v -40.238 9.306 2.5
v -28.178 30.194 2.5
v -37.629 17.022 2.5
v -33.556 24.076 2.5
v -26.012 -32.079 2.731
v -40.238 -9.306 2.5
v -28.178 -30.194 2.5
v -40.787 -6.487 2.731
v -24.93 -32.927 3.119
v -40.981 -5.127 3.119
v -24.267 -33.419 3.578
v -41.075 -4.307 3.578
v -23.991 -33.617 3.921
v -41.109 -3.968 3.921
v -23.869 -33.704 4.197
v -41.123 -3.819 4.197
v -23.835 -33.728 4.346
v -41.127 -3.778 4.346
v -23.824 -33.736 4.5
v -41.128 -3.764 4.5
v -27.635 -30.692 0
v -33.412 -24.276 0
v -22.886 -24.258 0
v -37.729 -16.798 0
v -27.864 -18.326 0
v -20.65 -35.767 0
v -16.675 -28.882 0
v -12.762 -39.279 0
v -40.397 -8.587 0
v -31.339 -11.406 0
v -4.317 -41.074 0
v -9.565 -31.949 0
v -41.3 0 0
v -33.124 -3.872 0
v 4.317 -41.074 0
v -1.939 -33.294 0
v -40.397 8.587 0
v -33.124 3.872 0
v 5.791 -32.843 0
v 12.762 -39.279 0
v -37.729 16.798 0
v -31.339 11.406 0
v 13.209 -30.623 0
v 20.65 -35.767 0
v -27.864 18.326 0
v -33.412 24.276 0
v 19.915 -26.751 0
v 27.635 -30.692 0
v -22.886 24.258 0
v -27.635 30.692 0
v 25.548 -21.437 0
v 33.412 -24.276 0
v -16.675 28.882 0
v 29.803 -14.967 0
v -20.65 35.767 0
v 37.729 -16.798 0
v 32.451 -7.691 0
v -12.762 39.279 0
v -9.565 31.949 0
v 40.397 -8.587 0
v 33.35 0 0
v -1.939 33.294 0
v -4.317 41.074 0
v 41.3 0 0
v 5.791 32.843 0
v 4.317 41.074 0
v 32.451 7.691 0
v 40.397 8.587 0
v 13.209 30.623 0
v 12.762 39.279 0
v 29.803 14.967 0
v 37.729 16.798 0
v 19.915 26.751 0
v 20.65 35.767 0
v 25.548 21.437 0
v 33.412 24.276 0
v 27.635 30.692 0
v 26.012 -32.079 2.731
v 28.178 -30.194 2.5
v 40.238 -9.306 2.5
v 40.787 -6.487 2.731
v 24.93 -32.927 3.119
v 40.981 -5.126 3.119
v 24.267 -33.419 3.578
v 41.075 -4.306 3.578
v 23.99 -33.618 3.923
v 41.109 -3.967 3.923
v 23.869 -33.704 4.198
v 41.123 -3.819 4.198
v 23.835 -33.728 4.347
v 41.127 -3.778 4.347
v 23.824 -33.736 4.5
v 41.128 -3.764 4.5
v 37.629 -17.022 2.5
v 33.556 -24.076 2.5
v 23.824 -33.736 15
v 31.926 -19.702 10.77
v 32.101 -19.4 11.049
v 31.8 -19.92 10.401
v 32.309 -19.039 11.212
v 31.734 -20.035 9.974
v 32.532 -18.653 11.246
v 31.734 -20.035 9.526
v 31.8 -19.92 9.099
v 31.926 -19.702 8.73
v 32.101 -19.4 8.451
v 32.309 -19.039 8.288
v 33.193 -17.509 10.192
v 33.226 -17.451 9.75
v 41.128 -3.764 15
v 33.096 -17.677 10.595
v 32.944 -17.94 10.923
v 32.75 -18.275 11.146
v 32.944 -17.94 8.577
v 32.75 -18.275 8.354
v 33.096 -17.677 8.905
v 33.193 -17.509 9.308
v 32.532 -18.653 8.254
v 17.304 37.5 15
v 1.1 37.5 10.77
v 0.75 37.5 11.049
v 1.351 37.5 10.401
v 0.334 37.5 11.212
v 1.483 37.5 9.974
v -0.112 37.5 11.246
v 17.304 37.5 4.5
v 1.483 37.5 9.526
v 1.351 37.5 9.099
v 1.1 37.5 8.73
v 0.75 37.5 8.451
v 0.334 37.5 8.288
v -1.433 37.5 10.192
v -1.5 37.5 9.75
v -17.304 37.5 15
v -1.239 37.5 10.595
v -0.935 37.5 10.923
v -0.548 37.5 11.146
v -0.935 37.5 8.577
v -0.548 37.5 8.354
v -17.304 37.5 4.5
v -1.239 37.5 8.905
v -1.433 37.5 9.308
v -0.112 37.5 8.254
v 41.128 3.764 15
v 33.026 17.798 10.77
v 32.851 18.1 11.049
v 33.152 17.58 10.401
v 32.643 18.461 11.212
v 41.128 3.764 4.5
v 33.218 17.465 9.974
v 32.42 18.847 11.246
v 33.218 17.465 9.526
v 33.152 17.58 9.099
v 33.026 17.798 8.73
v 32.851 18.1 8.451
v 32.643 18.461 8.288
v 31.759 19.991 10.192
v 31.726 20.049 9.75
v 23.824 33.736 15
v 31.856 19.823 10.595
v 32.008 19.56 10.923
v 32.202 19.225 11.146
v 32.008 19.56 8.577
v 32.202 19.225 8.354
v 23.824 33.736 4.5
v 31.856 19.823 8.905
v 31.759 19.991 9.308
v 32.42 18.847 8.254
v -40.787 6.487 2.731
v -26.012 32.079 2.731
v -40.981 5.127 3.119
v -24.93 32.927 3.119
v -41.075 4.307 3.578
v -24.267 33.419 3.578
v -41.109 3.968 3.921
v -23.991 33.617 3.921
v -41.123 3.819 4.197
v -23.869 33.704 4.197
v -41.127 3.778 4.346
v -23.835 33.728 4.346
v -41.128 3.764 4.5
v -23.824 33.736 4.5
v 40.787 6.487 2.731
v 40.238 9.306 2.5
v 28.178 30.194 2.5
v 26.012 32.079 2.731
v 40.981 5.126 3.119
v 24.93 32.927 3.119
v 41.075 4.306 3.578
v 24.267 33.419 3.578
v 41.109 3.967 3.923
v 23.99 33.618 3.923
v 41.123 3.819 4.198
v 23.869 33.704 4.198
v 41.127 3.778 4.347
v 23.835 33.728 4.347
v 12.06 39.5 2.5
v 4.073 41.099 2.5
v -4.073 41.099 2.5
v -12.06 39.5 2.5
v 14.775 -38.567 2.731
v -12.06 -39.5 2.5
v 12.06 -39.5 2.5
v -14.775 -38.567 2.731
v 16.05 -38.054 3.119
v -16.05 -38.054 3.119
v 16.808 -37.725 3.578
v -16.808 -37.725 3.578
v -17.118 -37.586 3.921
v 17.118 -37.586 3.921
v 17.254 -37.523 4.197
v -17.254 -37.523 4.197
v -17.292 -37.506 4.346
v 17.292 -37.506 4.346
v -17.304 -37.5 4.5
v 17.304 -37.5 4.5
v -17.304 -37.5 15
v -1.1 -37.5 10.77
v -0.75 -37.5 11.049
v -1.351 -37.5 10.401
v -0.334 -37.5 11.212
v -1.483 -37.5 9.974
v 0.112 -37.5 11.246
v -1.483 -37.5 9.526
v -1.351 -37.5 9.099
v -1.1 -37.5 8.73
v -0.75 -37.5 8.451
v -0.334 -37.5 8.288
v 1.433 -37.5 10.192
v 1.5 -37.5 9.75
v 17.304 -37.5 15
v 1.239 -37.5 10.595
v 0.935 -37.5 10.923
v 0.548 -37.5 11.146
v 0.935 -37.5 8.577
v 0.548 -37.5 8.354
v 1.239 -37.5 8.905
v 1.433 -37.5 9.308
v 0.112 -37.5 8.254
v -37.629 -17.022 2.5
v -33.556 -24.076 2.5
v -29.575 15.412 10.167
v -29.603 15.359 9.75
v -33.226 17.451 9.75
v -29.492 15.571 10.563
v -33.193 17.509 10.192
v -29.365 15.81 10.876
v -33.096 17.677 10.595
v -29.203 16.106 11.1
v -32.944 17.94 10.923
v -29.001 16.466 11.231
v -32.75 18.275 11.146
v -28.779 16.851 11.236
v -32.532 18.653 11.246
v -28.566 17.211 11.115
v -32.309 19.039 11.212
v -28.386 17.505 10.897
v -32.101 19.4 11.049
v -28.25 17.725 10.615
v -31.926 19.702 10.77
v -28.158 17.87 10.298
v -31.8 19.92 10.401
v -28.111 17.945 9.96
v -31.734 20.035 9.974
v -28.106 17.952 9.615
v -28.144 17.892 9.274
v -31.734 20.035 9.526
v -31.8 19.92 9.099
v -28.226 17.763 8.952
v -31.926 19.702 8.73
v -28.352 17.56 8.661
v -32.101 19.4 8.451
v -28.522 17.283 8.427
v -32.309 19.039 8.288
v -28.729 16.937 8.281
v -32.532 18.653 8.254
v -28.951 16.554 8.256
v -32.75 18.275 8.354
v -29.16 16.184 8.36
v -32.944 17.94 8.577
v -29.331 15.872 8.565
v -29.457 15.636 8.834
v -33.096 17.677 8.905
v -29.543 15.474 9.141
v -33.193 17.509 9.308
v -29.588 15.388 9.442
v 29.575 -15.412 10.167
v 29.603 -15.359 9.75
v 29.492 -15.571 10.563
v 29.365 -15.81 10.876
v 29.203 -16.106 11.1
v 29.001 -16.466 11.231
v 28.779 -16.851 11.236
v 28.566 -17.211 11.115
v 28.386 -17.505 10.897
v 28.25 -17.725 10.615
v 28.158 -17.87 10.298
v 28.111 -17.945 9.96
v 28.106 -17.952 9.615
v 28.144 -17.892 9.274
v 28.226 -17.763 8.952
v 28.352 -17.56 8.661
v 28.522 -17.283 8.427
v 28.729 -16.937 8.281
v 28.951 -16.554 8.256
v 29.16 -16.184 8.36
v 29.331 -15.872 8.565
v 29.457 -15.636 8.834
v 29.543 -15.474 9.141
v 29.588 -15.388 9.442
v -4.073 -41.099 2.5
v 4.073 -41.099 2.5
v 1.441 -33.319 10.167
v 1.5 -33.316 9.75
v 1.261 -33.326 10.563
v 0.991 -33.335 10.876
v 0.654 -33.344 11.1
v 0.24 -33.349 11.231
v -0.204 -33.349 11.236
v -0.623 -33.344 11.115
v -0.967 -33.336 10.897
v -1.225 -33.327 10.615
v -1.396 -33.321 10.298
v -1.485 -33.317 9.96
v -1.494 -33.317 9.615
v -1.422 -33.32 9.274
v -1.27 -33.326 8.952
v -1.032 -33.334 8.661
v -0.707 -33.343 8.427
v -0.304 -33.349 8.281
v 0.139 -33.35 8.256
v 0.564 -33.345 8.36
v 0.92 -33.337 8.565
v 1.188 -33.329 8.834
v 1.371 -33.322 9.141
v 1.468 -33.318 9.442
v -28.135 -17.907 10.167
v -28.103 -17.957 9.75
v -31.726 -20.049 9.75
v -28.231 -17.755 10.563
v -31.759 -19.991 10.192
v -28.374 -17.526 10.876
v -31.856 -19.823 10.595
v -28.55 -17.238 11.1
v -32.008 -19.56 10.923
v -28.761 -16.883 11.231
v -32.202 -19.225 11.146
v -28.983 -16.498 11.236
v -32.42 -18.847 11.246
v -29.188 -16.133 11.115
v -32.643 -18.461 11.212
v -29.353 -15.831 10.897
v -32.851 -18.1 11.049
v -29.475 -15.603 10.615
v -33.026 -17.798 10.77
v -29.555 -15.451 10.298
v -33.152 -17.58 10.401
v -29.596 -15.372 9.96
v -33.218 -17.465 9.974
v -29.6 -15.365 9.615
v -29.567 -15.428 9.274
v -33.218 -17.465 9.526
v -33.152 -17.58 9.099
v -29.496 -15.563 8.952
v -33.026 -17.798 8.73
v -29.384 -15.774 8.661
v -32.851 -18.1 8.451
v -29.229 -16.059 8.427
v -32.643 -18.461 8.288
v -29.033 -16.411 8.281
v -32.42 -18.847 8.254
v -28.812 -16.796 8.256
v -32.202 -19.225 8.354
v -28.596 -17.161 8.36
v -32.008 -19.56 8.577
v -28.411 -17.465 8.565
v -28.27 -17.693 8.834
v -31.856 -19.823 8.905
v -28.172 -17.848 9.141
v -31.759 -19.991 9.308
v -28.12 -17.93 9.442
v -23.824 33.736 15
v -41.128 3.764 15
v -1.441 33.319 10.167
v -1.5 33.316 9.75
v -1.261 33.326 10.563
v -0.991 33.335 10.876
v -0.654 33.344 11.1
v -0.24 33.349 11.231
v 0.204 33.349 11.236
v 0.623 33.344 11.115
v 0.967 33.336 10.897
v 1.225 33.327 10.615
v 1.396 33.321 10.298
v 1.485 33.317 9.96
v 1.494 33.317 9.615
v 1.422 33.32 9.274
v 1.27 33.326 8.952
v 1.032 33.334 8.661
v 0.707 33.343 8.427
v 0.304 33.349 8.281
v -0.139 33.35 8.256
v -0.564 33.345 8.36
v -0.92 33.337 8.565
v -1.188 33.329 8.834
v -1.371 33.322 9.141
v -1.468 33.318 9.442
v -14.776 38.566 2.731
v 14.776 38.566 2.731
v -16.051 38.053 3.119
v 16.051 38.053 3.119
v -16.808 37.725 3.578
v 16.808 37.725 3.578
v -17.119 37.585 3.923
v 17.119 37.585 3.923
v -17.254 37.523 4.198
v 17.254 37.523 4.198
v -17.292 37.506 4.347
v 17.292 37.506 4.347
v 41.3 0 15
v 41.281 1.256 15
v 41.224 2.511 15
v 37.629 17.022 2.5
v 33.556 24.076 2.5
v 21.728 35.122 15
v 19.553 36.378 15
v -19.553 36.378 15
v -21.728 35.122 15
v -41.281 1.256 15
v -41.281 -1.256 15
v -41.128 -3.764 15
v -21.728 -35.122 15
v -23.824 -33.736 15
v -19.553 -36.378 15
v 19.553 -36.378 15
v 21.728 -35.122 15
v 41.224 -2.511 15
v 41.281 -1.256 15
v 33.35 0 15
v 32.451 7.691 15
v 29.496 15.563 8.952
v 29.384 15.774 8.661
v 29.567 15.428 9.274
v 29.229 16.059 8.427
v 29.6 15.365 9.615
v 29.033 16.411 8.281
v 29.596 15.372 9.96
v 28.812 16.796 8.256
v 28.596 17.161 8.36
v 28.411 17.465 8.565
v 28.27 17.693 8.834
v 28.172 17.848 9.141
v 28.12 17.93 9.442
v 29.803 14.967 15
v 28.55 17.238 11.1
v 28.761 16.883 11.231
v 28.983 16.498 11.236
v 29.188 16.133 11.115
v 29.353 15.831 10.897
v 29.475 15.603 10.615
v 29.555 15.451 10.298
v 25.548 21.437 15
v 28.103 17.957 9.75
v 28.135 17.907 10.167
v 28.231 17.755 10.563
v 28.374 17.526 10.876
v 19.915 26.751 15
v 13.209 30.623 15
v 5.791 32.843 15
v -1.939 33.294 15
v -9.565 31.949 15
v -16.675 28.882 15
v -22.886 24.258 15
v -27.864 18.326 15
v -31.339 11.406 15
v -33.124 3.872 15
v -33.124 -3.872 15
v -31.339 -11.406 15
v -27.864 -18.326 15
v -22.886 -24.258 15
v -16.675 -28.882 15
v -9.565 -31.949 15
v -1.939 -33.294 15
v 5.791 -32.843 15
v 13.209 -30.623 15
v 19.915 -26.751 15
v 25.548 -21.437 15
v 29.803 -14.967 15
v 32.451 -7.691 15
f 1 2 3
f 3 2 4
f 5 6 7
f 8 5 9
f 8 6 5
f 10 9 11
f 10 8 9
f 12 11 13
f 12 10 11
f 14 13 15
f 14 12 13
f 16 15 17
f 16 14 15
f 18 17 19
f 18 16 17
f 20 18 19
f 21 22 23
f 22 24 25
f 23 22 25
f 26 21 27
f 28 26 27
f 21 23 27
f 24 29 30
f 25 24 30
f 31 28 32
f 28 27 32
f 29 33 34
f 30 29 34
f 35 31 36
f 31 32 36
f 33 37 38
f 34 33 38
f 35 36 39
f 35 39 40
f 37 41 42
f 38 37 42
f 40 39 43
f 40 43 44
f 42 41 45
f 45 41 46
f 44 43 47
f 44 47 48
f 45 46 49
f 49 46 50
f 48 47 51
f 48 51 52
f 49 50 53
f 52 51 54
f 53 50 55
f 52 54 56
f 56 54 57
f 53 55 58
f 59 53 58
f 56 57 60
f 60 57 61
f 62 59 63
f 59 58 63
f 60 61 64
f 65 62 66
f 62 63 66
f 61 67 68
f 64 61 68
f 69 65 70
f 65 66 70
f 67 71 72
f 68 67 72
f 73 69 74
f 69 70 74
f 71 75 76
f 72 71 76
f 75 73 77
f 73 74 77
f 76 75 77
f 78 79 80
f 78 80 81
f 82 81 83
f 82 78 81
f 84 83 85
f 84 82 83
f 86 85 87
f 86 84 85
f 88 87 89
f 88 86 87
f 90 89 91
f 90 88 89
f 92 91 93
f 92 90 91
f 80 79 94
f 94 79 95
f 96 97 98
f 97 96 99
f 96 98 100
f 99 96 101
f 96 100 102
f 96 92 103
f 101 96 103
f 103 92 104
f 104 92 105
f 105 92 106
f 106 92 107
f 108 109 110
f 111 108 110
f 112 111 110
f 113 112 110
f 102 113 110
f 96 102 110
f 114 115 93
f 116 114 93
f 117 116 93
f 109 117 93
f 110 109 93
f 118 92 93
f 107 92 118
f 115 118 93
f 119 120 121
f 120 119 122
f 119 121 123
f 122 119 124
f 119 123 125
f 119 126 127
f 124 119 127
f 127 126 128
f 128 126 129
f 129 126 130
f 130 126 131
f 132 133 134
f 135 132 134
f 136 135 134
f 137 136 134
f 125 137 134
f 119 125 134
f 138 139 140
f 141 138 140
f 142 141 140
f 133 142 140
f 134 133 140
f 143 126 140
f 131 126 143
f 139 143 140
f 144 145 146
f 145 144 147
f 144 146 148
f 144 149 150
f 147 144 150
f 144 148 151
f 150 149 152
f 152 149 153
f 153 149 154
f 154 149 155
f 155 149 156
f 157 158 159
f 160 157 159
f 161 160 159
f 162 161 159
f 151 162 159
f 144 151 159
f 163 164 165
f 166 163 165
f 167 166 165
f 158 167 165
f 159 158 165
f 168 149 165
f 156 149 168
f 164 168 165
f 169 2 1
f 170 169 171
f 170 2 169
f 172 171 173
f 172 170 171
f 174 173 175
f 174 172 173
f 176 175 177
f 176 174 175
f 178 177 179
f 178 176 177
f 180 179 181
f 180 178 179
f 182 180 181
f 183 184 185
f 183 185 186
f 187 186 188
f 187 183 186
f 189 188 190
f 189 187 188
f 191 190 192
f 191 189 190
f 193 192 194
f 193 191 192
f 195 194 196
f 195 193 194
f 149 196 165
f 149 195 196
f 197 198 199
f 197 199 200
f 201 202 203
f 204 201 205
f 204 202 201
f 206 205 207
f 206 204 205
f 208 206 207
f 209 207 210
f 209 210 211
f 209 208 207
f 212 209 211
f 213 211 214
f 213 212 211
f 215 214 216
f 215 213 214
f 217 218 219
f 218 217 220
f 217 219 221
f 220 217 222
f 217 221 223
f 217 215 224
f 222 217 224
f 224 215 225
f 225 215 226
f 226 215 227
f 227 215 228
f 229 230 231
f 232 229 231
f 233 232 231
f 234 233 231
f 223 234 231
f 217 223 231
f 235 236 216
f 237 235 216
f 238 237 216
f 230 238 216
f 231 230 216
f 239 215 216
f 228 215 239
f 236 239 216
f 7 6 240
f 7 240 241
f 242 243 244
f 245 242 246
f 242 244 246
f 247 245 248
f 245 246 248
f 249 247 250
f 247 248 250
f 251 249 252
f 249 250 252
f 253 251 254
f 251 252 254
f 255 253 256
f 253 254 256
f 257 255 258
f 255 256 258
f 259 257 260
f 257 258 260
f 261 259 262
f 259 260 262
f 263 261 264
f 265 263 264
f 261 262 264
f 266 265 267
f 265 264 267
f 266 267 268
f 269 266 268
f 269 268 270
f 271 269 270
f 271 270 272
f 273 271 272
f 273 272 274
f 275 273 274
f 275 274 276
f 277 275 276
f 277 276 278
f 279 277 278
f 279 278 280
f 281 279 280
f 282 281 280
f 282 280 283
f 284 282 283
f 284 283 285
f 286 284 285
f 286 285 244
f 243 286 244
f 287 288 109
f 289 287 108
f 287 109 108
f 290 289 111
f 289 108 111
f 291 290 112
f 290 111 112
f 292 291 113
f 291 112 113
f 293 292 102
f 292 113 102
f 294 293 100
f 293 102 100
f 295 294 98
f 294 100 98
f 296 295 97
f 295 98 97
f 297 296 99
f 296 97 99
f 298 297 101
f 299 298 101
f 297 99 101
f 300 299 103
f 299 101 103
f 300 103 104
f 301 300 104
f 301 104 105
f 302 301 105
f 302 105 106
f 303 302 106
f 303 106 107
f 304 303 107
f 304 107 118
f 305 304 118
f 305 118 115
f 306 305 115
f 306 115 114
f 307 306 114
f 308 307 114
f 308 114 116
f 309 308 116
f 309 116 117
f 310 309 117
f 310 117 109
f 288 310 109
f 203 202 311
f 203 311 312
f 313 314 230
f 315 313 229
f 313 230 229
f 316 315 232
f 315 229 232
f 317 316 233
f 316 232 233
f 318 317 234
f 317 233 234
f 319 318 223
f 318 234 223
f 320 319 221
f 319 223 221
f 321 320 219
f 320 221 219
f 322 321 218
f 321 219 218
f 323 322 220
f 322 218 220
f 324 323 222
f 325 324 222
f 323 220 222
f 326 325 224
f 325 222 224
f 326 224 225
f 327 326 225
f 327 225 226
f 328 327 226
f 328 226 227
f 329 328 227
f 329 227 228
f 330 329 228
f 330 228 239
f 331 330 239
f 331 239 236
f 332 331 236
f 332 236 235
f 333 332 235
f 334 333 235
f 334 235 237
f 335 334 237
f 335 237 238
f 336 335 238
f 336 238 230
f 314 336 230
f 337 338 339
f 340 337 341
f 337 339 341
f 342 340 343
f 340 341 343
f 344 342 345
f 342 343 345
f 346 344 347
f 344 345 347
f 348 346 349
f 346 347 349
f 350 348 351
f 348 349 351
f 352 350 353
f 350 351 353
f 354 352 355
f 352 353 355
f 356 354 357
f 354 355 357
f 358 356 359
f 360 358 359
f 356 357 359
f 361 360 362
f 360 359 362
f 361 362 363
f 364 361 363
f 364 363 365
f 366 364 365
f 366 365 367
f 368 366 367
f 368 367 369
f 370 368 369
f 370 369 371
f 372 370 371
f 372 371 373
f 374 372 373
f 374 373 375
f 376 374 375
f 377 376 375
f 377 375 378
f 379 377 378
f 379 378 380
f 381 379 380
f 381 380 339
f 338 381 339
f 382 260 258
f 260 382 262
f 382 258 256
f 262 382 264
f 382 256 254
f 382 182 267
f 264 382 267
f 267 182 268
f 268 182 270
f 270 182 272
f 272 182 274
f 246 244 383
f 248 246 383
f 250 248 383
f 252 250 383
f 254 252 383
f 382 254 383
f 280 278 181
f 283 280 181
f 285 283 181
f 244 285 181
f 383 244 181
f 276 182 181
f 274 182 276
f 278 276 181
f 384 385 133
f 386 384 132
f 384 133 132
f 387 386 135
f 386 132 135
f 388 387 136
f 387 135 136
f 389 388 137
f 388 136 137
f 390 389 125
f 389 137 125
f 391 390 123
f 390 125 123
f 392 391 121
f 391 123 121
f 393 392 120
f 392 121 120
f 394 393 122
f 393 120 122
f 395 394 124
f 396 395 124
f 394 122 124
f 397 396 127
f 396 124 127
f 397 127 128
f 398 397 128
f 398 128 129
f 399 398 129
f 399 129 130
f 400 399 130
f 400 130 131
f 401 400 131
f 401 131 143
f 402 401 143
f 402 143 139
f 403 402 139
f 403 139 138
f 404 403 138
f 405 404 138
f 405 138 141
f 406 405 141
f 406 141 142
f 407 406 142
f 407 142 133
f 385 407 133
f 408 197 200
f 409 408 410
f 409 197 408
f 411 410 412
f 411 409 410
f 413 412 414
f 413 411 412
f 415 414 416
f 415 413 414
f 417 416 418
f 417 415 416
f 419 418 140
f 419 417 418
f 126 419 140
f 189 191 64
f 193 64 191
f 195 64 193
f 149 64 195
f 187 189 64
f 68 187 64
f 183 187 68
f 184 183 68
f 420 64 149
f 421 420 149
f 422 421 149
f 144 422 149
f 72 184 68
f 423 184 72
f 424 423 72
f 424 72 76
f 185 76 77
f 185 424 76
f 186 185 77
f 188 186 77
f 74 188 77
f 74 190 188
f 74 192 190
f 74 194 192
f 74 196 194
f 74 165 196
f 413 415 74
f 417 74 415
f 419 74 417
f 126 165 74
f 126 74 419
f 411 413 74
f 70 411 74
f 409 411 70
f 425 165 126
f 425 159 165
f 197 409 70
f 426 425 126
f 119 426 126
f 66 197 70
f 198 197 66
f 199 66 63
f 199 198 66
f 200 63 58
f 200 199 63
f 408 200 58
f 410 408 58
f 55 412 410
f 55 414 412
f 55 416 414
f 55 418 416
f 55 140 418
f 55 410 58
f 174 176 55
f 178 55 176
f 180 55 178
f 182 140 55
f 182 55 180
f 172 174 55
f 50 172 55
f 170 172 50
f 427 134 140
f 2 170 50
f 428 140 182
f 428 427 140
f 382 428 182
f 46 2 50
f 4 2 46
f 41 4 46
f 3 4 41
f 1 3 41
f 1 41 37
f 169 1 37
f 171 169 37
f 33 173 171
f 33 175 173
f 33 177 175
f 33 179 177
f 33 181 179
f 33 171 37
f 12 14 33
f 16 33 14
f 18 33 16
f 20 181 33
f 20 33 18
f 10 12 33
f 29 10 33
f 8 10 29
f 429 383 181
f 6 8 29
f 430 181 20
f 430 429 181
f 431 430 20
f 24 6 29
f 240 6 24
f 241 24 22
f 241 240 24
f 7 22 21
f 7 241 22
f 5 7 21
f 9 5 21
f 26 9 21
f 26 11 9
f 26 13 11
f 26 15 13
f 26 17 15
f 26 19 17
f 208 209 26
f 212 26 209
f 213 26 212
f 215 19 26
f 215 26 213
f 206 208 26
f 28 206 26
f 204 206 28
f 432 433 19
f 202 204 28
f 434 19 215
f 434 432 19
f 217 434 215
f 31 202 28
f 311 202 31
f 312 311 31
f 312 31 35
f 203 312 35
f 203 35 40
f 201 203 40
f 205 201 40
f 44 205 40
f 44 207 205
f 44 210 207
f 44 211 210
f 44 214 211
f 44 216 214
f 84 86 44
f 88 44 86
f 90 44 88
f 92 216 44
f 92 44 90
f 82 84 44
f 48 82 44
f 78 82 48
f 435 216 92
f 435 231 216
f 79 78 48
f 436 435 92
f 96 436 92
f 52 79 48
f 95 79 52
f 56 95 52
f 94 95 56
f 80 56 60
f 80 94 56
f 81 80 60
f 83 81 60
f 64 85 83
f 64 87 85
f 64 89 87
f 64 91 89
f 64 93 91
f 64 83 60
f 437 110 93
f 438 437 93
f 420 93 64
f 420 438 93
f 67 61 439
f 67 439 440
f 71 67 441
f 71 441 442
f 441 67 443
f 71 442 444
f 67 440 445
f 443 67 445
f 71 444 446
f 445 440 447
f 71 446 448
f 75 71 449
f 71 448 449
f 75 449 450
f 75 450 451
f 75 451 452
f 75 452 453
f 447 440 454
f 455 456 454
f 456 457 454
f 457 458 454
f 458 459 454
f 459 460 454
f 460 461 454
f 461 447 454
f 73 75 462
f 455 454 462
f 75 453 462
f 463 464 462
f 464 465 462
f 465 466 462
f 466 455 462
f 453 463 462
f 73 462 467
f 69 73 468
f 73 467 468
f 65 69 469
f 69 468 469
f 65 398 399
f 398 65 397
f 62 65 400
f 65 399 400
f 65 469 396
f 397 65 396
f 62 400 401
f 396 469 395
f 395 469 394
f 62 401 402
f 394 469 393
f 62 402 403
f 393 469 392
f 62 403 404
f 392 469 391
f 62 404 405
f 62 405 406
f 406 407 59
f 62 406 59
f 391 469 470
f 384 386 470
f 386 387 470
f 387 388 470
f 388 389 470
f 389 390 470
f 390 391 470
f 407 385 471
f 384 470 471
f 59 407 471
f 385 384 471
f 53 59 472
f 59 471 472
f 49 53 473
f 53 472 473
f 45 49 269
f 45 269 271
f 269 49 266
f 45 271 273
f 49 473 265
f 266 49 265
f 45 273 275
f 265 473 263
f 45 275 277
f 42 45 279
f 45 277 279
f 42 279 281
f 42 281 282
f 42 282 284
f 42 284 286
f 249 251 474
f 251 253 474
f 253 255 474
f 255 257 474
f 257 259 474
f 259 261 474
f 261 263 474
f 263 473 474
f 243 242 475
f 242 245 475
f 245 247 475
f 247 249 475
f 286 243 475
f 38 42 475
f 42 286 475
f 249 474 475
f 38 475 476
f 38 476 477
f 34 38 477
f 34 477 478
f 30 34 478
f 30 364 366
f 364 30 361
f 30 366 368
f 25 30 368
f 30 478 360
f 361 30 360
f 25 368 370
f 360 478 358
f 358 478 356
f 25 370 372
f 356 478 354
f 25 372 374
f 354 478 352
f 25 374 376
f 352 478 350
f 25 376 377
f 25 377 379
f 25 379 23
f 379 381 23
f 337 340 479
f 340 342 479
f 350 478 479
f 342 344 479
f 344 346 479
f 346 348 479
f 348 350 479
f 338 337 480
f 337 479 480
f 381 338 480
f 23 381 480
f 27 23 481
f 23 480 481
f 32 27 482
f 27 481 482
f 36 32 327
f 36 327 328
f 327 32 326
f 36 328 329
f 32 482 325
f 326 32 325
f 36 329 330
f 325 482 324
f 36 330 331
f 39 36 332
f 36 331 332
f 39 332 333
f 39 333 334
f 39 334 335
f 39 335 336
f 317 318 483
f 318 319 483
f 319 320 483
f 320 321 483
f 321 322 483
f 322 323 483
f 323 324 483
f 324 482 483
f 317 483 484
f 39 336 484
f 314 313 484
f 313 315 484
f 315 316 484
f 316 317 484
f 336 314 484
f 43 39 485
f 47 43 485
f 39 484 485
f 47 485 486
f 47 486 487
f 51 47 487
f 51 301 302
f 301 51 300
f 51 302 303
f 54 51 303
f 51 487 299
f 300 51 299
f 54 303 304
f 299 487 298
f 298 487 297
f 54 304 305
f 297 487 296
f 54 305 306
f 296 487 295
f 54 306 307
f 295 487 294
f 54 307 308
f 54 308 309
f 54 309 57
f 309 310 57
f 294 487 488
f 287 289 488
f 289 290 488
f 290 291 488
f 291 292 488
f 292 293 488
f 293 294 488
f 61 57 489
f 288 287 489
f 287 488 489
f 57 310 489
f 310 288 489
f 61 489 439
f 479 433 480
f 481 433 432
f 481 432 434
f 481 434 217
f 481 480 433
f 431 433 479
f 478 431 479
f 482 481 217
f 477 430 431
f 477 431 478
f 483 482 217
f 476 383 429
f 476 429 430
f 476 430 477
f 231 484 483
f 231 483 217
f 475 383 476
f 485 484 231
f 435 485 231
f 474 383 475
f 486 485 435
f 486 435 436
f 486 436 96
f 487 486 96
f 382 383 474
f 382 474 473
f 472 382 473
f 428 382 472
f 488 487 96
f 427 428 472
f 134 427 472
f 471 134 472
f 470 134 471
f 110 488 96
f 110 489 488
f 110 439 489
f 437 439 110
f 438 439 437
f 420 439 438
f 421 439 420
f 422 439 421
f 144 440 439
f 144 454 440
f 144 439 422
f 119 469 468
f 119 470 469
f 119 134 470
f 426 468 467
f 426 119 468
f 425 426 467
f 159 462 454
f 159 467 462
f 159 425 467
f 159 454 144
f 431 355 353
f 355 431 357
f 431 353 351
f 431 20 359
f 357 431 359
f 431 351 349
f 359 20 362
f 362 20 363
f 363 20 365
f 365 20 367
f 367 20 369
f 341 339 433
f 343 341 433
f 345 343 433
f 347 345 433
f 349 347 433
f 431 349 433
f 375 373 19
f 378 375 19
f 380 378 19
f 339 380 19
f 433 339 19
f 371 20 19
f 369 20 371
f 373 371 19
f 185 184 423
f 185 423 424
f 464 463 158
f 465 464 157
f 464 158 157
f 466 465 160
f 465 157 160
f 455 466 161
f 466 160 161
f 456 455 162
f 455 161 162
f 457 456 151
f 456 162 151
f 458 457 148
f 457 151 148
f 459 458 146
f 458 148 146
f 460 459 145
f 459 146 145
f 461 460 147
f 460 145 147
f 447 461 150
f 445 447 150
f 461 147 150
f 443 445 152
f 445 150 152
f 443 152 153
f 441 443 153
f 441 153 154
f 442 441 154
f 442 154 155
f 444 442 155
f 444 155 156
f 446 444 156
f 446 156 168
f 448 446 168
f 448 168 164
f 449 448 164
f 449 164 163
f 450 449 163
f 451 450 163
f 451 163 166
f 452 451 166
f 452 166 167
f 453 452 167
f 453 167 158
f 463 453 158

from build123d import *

# Parameters (mm, degrees)
SZKIC2_R                    = 46.017617149
DODANIE_WYCI_GNI_CIE1_DEPTH = 2.5
DODANIE_WYCI_GNI_CIE2_DEPTH = 15
SZKIC3_R                    = 46.5
SZKIC3_R_2                  = 42.5
WYTNIJ_WYCI_GNI_CIE3_DEPTH  = 10
SZKIC8_R                    = 33.35
WYTNIJ_WYCI_GNI_CIE2_DEPTH  = 62.947558467
ZAOKR_GLENIE2_R             = 2
SZKIC9_R                    = 1.5
WYTNIJ_WYCI_GNI_CIE4_DEPTH  = 10
SZYK_KO_OWY1_COUNT          = 6
SZKIC10_R                   = 50
SZKIC10_R_2                 = 41.3
WYTNIJ_WYCI_GNI_CIE5_DEPTH  = 62.947558491


with BuildPart() as part:
    # Szkic2 → Dodanie-wyci_gni_cie1 (new body)
    with BuildSketch(Plane.XY):
        Circle(SZKIC2_R)
    extrude(amount=DODANIE_WYCI_GNI_CIE1_DEPTH)

    # Szkic2_3 → Dodanie-wyci_gni_cie2 (add)
    with BuildSketch(Plane.XY):
        with BuildLine():
            ThreePointArc((17.776388835, -37.5), (20.75, -35.940054257), (23.587758225, -34.144804318))
            Line((23.587758225, -34.144804318), (41.364147059, -3.355195682))
            ThreePointArc((41.364147059, -3.355195682), (41.466022856, -1.67897246), (41.5, 0))
            ThreePointArc((41.5, 0), (41.466022856, 1.67897246), (41.364147059, 3.355195682))
            Line((41.364147059, 3.355195682), (23.587758225, 34.144804318))
            ThreePointArc((23.587758225, 34.144804318), (20.75, 35.940054257), (17.776388835, 37.5))
            Line((17.776388835, 37.5), (-17.776388835, 37.5))
            ThreePointArc((-17.776388835, 37.5), (-20.75, 35.940054257), (-23.587758225, 34.144804318))
            Line((-23.587758225, 34.144804318), (-41.364147059, 3.355195682))
            ThreePointArc((-41.364147059, 3.355195682), (-41.5, 0), (-41.364147059, -3.355195682))
            Line((-41.364147059, -3.355195682), (-23.587758225, -34.144804318))
            ThreePointArc((-23.587758225, -34.144804318), (-20.75, -35.940054257), (-17.776388835, -37.5))
            Line((-17.776388835, -37.5), (17.776388835, -37.5))
        make_face()
    extrude(amount=DODANIE_WYCI_GNI_CIE2_DEPTH)

    # Szkic3 → Wytnij-wyci_gni_cie3 (cut)
    with BuildSketch(Plane(origin=(0, 0, 2.5), x_dir=(-1, 0, 0), z_dir=(0, 0, -1))):
        Circle(SZKIC3_R)
        Circle(SZKIC3_R_2, mode=Mode.SUBTRACT)
    extrude(amount=WYTNIJ_WYCI_GNI_CIE3_DEPTH, mode=Mode.SUBTRACT)

    # Szkic8 → Wytnij-wyci_gni_cie2 (cut, through all)
    with BuildSketch(Plane.XY.offset(15)):
        Circle(SZKIC8_R)
    extrude(amount=-WYTNIJ_WYCI_GNI_CIE2_DEPTH, mode=Mode.SUBTRACT)

    # Zaokr_glenie2
    zaokr_glenie2_edges = [part.edges().sort_by_distance(p)[0] for p in [
        (-32.475952642, 18.75, 2.5),
        (0, 37.5, 2.5),
        (32.475952642, 18.75, 2.5),
        (32.475952642, -18.75, 2.5),
        (0, -37.5, 2.5),
        (-32.475952642, -18.75, 2.5),
    ]]
    fillet(zaokr_glenie2_edges, radius=ZAOKR_GLENIE2_R)

    # Szkic9 → Wytnij-wyci_gni_cie4 (cut)
    with BuildSketch(Plane(origin=(-32.475952642, -18.75, 0), x_dir=(0, 0, 1), z_dir=(-0.8660254037844386, -0.5000000000000001, 0))):
        with Locations((9.75, 0)):
            Circle(SZKIC9_R)
    wytnij_wyci_gni_cie4 = extrude(amount=-WYTNIJ_WYCI_GNI_CIE4_DEPTH, mode=Mode.SUBTRACT)

    # Szyk ko_owy1: Wytnij-wyci_gni_cie4 ×6 about axis
    szyk_ko_owy1_axis = Axis((0, 0, 15), (0, 0, -1))
    for i in range(1, SZYK_KO_OWY1_COUNT):
        add(wytnij_wyci_gni_cie4.rotate(szyk_ko_owy1_axis, i * 360 / SZYK_KO_OWY1_COUNT), mode=Mode.SUBTRACT)

    # Szkic10 → Wytnij-wyci_gni_cie5 (cut, through all)
    with BuildSketch(Plane.XY.offset(15)):
        Circle(SZKIC10_R)
        Circle(SZKIC10_R_2, mode=Mode.SUBTRACT)
    extrude(amount=-WYTNIJ_WYCI_GNI_CIE5_DEPTH, mode=Mode.SUBTRACT)


solid = part.part
